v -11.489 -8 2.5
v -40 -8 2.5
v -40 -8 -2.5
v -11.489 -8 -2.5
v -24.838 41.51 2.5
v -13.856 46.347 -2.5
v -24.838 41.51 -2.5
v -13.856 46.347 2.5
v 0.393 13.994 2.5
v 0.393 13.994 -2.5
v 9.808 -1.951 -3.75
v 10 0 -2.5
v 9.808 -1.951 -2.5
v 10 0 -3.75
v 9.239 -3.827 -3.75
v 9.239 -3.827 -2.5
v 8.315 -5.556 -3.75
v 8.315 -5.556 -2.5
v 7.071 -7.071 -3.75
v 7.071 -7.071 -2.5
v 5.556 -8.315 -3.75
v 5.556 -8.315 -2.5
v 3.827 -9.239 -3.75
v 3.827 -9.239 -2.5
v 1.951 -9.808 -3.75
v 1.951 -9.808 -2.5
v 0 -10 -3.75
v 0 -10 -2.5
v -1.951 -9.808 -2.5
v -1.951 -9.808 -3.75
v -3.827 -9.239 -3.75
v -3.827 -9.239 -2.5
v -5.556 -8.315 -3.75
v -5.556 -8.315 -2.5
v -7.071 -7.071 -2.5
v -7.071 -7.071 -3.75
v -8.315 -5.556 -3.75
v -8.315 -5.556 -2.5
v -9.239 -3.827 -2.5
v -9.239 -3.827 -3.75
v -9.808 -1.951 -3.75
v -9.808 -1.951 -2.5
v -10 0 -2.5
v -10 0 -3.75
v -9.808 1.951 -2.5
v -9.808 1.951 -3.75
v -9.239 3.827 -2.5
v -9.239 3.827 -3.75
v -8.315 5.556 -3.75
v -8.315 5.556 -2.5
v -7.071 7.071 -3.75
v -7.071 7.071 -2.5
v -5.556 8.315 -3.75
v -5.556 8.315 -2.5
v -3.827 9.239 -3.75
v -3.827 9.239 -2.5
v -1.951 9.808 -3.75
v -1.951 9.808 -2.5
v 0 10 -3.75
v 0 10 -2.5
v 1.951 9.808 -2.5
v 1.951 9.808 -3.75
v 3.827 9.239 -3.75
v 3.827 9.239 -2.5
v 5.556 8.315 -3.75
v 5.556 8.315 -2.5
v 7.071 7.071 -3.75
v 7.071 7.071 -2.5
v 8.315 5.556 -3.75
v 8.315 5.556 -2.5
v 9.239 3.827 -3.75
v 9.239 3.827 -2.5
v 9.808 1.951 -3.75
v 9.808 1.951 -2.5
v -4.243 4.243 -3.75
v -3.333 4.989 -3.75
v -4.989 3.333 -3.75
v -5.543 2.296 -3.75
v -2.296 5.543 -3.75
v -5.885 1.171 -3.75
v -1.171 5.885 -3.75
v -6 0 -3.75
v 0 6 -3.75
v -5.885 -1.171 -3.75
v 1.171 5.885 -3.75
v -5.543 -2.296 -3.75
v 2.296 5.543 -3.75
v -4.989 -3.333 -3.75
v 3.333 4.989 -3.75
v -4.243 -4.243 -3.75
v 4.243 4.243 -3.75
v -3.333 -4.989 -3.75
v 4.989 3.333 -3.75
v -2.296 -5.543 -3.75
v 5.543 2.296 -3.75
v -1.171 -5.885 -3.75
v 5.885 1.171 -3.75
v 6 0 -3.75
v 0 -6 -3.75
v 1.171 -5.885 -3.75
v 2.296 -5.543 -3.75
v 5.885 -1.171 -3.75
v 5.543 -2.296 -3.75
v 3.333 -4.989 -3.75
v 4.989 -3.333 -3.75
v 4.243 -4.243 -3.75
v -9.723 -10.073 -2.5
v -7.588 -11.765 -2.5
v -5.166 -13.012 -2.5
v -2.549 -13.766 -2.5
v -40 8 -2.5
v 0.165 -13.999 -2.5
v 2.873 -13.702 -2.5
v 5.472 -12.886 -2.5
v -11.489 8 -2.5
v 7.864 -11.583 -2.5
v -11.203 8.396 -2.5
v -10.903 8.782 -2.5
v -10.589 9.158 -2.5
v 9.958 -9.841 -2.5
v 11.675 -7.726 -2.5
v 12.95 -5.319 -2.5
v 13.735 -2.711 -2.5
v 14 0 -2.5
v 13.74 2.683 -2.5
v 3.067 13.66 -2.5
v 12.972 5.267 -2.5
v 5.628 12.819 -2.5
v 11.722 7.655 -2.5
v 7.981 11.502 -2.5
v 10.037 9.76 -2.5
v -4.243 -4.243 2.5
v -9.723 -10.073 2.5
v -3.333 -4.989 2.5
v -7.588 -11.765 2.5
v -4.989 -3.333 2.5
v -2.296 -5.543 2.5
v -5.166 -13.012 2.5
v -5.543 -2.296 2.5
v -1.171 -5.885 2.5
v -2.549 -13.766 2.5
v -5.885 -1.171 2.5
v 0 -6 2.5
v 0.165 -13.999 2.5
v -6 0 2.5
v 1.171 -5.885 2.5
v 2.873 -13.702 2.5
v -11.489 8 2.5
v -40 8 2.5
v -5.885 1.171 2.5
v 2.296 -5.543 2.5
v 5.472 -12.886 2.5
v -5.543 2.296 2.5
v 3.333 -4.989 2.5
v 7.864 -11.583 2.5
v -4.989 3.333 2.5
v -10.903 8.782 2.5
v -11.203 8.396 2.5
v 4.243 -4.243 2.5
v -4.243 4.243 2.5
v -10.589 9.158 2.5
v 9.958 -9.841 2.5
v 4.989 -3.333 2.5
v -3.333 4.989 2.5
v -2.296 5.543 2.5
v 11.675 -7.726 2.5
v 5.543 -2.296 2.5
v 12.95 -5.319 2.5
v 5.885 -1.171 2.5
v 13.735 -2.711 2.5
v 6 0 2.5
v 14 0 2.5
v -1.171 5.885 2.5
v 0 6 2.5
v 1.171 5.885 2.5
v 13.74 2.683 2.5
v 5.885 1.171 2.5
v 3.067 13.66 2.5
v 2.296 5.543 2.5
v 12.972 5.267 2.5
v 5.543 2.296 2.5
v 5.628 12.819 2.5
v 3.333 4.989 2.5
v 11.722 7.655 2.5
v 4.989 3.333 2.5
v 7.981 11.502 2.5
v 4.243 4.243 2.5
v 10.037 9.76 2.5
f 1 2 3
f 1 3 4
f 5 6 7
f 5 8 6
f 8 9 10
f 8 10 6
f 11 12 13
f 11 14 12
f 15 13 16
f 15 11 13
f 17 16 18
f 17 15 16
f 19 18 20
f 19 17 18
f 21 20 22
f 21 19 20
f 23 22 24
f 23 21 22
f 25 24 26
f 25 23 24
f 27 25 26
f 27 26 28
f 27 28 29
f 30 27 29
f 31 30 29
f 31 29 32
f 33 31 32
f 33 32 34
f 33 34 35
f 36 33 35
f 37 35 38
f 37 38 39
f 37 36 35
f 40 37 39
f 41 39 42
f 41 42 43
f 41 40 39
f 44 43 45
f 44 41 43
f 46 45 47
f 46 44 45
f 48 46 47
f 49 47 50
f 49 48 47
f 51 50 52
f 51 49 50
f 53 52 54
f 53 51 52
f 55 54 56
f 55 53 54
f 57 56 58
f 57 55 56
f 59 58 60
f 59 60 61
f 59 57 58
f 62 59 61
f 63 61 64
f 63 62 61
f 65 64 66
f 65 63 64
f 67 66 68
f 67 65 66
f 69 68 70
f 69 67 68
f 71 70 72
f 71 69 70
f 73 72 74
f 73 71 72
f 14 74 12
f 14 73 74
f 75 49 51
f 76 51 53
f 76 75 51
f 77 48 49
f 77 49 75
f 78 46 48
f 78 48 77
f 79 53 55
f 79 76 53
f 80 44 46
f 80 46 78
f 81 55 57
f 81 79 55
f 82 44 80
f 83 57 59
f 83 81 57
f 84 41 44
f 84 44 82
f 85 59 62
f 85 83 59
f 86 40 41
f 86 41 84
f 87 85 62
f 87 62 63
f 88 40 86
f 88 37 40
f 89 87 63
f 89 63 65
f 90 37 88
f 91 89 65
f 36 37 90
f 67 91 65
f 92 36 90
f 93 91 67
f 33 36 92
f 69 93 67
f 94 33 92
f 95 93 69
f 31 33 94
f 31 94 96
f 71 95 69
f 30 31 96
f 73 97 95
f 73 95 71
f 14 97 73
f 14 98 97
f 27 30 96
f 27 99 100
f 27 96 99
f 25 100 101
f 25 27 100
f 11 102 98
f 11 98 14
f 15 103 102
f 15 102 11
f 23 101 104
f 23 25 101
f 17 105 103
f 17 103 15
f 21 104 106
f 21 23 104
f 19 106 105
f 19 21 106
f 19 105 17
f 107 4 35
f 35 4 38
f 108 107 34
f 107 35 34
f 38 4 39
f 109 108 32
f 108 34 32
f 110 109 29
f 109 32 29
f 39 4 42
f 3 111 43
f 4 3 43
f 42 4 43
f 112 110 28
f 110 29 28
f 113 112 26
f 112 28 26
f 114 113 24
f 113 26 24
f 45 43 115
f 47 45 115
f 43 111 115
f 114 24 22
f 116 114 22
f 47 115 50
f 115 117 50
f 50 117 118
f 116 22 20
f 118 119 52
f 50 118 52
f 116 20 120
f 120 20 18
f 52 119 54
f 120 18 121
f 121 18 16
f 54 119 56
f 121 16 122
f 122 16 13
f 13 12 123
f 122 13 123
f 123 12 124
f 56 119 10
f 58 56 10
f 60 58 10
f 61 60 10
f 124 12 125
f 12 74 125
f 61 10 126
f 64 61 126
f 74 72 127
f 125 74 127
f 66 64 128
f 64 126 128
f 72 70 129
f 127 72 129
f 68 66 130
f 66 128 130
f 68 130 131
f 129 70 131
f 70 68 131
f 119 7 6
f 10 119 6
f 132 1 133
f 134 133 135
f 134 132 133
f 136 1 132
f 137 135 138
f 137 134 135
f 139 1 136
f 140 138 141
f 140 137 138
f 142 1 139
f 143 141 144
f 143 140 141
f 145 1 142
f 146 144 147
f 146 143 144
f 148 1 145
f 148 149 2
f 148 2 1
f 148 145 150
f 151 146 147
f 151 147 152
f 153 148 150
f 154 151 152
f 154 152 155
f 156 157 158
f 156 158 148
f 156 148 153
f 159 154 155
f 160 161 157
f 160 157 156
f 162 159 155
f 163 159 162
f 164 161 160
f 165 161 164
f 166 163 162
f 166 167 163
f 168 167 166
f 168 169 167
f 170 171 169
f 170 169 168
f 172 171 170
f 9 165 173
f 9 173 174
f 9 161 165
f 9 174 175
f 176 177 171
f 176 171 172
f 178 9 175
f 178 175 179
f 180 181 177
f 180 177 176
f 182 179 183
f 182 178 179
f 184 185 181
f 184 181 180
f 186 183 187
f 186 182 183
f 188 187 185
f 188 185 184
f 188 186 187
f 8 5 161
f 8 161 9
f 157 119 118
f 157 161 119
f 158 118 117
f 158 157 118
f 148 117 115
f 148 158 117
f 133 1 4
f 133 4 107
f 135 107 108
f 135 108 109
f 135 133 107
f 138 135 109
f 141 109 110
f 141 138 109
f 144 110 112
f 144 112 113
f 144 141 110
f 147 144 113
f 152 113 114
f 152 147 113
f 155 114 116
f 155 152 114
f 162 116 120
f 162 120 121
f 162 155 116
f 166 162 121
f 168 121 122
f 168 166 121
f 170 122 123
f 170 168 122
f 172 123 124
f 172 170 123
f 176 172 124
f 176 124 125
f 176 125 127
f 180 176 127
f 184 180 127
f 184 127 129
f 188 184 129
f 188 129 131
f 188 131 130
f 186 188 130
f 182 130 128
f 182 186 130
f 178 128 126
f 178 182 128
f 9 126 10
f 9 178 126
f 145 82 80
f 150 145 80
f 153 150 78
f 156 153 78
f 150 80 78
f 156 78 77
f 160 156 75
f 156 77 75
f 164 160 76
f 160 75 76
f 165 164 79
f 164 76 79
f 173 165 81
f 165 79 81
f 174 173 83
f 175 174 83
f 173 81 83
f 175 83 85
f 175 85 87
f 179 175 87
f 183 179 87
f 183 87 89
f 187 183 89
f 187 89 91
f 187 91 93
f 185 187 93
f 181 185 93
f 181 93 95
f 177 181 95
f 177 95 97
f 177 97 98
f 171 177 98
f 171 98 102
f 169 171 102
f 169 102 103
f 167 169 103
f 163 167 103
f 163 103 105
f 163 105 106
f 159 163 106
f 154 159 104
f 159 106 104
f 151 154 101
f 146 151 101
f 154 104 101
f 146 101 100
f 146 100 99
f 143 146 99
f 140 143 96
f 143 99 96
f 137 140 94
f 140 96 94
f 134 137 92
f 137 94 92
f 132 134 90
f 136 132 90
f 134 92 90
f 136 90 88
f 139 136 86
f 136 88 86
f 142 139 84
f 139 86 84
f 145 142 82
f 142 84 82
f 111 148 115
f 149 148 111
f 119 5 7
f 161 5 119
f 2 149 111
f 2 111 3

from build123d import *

# Parameters (mm, degrees)
BOSS_EXTRU_1_DEPTH      = 2.5
ESQUISSE2_R             = 10
BOSS_EXTRU_2_DEPTH      = 1.25
ESQUISSE3_R             = 6
ENL_V_MAT_EXTRU_1_DEPTH = 62.539171077


with BuildPart() as part:
    # Esquisse1 → Boss.-Extru.1 (new, symmetric)
    with BuildSketch(Plane.XY):
        with BuildLine():
            Line((0.392596459, 13.994494204), (-10.5894536, 9.157700172))
            ThreePointArc((-10.5894536, 9.157700172), (-11.054455161, 8.590635663), (-11.489125293, 8))
            Line((-11.489125293, 8), (-11.489125293, -8))
            ThreePointArc((-11.489125293, -8), (4.192388692, -13.357540082), (14, 0))
            ThreePointArc((14, 0), (10.03733905, 9.759704134), (0.392596459, 13.994494204))
        make_face()
        with BuildLine():
            ThreePointArc((0.392596459, 13.994494204), (-5.64292637, 12.812391735), (-10.5894536, 9.157700172))
            Line((-10.5894536, 9.157700172), (0.392596459, 13.994494204))
        make_face()
        with BuildLine():
            Line((-11.489125293, -8), (-11.489125293, 8))
            ThreePointArc((-11.489125293, 8), (-14, 0), (-11.489125293, -8))
        make_face()
        with BuildLine():
            ThreePointArc((-11.489125293, -8), (-14, 0), (-11.489125293, 8))
            Line((-11.489125293, 8), (-40, 8))
            Line((-40, 8), (-40, -8))
            Line((-40, -8), (-11.489125293, -8))
        make_face()
        with BuildLine():
            Line((-13.856151097, 46.346597251), (-24.838201156, 41.50980322))
            Line((-24.838201156, 41.50980322), (-10.5894536, 9.157700172))
            ThreePointArc((-10.5894536, 9.157700172), (-5.64292637, 12.812391735), (0.392596459, 13.994494204))
            Line((0.392596459, 13.994494204), (-13.856151097, 46.346597251))
        make_face()
    extrude(amount=BOSS_EXTRU_1_DEPTH, both=True)

    # Esquisse2 → Boss.-Extru.2 (add, symmetric)
    with BuildSketch(Plane(origin=(0, 0, -2.5), x_dir=(-1, 0, 0), z_dir=(0, 0, -1))):
        with Locations(Location((0, 0, 0), (0, 0, 180))):
            Circle(ESQUISSE2_R)
    extrude(amount=BOSS_EXTRU_2_DEPTH, both=True)

    # Esquisse3 → Enlèv. mat.-Extru.1 (cut, through all)
    with BuildSketch(Plane(origin=(0, 0, -3.75), x_dir=(-1, 0, 0), z_dir=(0, 0, -1))):
        Circle(ESQUISSE3_R)
    extrude(amount=-ENL_V_MAT_EXTRU_1_DEPTH, mode=Mode.SUBTRACT)


solid = part.part
